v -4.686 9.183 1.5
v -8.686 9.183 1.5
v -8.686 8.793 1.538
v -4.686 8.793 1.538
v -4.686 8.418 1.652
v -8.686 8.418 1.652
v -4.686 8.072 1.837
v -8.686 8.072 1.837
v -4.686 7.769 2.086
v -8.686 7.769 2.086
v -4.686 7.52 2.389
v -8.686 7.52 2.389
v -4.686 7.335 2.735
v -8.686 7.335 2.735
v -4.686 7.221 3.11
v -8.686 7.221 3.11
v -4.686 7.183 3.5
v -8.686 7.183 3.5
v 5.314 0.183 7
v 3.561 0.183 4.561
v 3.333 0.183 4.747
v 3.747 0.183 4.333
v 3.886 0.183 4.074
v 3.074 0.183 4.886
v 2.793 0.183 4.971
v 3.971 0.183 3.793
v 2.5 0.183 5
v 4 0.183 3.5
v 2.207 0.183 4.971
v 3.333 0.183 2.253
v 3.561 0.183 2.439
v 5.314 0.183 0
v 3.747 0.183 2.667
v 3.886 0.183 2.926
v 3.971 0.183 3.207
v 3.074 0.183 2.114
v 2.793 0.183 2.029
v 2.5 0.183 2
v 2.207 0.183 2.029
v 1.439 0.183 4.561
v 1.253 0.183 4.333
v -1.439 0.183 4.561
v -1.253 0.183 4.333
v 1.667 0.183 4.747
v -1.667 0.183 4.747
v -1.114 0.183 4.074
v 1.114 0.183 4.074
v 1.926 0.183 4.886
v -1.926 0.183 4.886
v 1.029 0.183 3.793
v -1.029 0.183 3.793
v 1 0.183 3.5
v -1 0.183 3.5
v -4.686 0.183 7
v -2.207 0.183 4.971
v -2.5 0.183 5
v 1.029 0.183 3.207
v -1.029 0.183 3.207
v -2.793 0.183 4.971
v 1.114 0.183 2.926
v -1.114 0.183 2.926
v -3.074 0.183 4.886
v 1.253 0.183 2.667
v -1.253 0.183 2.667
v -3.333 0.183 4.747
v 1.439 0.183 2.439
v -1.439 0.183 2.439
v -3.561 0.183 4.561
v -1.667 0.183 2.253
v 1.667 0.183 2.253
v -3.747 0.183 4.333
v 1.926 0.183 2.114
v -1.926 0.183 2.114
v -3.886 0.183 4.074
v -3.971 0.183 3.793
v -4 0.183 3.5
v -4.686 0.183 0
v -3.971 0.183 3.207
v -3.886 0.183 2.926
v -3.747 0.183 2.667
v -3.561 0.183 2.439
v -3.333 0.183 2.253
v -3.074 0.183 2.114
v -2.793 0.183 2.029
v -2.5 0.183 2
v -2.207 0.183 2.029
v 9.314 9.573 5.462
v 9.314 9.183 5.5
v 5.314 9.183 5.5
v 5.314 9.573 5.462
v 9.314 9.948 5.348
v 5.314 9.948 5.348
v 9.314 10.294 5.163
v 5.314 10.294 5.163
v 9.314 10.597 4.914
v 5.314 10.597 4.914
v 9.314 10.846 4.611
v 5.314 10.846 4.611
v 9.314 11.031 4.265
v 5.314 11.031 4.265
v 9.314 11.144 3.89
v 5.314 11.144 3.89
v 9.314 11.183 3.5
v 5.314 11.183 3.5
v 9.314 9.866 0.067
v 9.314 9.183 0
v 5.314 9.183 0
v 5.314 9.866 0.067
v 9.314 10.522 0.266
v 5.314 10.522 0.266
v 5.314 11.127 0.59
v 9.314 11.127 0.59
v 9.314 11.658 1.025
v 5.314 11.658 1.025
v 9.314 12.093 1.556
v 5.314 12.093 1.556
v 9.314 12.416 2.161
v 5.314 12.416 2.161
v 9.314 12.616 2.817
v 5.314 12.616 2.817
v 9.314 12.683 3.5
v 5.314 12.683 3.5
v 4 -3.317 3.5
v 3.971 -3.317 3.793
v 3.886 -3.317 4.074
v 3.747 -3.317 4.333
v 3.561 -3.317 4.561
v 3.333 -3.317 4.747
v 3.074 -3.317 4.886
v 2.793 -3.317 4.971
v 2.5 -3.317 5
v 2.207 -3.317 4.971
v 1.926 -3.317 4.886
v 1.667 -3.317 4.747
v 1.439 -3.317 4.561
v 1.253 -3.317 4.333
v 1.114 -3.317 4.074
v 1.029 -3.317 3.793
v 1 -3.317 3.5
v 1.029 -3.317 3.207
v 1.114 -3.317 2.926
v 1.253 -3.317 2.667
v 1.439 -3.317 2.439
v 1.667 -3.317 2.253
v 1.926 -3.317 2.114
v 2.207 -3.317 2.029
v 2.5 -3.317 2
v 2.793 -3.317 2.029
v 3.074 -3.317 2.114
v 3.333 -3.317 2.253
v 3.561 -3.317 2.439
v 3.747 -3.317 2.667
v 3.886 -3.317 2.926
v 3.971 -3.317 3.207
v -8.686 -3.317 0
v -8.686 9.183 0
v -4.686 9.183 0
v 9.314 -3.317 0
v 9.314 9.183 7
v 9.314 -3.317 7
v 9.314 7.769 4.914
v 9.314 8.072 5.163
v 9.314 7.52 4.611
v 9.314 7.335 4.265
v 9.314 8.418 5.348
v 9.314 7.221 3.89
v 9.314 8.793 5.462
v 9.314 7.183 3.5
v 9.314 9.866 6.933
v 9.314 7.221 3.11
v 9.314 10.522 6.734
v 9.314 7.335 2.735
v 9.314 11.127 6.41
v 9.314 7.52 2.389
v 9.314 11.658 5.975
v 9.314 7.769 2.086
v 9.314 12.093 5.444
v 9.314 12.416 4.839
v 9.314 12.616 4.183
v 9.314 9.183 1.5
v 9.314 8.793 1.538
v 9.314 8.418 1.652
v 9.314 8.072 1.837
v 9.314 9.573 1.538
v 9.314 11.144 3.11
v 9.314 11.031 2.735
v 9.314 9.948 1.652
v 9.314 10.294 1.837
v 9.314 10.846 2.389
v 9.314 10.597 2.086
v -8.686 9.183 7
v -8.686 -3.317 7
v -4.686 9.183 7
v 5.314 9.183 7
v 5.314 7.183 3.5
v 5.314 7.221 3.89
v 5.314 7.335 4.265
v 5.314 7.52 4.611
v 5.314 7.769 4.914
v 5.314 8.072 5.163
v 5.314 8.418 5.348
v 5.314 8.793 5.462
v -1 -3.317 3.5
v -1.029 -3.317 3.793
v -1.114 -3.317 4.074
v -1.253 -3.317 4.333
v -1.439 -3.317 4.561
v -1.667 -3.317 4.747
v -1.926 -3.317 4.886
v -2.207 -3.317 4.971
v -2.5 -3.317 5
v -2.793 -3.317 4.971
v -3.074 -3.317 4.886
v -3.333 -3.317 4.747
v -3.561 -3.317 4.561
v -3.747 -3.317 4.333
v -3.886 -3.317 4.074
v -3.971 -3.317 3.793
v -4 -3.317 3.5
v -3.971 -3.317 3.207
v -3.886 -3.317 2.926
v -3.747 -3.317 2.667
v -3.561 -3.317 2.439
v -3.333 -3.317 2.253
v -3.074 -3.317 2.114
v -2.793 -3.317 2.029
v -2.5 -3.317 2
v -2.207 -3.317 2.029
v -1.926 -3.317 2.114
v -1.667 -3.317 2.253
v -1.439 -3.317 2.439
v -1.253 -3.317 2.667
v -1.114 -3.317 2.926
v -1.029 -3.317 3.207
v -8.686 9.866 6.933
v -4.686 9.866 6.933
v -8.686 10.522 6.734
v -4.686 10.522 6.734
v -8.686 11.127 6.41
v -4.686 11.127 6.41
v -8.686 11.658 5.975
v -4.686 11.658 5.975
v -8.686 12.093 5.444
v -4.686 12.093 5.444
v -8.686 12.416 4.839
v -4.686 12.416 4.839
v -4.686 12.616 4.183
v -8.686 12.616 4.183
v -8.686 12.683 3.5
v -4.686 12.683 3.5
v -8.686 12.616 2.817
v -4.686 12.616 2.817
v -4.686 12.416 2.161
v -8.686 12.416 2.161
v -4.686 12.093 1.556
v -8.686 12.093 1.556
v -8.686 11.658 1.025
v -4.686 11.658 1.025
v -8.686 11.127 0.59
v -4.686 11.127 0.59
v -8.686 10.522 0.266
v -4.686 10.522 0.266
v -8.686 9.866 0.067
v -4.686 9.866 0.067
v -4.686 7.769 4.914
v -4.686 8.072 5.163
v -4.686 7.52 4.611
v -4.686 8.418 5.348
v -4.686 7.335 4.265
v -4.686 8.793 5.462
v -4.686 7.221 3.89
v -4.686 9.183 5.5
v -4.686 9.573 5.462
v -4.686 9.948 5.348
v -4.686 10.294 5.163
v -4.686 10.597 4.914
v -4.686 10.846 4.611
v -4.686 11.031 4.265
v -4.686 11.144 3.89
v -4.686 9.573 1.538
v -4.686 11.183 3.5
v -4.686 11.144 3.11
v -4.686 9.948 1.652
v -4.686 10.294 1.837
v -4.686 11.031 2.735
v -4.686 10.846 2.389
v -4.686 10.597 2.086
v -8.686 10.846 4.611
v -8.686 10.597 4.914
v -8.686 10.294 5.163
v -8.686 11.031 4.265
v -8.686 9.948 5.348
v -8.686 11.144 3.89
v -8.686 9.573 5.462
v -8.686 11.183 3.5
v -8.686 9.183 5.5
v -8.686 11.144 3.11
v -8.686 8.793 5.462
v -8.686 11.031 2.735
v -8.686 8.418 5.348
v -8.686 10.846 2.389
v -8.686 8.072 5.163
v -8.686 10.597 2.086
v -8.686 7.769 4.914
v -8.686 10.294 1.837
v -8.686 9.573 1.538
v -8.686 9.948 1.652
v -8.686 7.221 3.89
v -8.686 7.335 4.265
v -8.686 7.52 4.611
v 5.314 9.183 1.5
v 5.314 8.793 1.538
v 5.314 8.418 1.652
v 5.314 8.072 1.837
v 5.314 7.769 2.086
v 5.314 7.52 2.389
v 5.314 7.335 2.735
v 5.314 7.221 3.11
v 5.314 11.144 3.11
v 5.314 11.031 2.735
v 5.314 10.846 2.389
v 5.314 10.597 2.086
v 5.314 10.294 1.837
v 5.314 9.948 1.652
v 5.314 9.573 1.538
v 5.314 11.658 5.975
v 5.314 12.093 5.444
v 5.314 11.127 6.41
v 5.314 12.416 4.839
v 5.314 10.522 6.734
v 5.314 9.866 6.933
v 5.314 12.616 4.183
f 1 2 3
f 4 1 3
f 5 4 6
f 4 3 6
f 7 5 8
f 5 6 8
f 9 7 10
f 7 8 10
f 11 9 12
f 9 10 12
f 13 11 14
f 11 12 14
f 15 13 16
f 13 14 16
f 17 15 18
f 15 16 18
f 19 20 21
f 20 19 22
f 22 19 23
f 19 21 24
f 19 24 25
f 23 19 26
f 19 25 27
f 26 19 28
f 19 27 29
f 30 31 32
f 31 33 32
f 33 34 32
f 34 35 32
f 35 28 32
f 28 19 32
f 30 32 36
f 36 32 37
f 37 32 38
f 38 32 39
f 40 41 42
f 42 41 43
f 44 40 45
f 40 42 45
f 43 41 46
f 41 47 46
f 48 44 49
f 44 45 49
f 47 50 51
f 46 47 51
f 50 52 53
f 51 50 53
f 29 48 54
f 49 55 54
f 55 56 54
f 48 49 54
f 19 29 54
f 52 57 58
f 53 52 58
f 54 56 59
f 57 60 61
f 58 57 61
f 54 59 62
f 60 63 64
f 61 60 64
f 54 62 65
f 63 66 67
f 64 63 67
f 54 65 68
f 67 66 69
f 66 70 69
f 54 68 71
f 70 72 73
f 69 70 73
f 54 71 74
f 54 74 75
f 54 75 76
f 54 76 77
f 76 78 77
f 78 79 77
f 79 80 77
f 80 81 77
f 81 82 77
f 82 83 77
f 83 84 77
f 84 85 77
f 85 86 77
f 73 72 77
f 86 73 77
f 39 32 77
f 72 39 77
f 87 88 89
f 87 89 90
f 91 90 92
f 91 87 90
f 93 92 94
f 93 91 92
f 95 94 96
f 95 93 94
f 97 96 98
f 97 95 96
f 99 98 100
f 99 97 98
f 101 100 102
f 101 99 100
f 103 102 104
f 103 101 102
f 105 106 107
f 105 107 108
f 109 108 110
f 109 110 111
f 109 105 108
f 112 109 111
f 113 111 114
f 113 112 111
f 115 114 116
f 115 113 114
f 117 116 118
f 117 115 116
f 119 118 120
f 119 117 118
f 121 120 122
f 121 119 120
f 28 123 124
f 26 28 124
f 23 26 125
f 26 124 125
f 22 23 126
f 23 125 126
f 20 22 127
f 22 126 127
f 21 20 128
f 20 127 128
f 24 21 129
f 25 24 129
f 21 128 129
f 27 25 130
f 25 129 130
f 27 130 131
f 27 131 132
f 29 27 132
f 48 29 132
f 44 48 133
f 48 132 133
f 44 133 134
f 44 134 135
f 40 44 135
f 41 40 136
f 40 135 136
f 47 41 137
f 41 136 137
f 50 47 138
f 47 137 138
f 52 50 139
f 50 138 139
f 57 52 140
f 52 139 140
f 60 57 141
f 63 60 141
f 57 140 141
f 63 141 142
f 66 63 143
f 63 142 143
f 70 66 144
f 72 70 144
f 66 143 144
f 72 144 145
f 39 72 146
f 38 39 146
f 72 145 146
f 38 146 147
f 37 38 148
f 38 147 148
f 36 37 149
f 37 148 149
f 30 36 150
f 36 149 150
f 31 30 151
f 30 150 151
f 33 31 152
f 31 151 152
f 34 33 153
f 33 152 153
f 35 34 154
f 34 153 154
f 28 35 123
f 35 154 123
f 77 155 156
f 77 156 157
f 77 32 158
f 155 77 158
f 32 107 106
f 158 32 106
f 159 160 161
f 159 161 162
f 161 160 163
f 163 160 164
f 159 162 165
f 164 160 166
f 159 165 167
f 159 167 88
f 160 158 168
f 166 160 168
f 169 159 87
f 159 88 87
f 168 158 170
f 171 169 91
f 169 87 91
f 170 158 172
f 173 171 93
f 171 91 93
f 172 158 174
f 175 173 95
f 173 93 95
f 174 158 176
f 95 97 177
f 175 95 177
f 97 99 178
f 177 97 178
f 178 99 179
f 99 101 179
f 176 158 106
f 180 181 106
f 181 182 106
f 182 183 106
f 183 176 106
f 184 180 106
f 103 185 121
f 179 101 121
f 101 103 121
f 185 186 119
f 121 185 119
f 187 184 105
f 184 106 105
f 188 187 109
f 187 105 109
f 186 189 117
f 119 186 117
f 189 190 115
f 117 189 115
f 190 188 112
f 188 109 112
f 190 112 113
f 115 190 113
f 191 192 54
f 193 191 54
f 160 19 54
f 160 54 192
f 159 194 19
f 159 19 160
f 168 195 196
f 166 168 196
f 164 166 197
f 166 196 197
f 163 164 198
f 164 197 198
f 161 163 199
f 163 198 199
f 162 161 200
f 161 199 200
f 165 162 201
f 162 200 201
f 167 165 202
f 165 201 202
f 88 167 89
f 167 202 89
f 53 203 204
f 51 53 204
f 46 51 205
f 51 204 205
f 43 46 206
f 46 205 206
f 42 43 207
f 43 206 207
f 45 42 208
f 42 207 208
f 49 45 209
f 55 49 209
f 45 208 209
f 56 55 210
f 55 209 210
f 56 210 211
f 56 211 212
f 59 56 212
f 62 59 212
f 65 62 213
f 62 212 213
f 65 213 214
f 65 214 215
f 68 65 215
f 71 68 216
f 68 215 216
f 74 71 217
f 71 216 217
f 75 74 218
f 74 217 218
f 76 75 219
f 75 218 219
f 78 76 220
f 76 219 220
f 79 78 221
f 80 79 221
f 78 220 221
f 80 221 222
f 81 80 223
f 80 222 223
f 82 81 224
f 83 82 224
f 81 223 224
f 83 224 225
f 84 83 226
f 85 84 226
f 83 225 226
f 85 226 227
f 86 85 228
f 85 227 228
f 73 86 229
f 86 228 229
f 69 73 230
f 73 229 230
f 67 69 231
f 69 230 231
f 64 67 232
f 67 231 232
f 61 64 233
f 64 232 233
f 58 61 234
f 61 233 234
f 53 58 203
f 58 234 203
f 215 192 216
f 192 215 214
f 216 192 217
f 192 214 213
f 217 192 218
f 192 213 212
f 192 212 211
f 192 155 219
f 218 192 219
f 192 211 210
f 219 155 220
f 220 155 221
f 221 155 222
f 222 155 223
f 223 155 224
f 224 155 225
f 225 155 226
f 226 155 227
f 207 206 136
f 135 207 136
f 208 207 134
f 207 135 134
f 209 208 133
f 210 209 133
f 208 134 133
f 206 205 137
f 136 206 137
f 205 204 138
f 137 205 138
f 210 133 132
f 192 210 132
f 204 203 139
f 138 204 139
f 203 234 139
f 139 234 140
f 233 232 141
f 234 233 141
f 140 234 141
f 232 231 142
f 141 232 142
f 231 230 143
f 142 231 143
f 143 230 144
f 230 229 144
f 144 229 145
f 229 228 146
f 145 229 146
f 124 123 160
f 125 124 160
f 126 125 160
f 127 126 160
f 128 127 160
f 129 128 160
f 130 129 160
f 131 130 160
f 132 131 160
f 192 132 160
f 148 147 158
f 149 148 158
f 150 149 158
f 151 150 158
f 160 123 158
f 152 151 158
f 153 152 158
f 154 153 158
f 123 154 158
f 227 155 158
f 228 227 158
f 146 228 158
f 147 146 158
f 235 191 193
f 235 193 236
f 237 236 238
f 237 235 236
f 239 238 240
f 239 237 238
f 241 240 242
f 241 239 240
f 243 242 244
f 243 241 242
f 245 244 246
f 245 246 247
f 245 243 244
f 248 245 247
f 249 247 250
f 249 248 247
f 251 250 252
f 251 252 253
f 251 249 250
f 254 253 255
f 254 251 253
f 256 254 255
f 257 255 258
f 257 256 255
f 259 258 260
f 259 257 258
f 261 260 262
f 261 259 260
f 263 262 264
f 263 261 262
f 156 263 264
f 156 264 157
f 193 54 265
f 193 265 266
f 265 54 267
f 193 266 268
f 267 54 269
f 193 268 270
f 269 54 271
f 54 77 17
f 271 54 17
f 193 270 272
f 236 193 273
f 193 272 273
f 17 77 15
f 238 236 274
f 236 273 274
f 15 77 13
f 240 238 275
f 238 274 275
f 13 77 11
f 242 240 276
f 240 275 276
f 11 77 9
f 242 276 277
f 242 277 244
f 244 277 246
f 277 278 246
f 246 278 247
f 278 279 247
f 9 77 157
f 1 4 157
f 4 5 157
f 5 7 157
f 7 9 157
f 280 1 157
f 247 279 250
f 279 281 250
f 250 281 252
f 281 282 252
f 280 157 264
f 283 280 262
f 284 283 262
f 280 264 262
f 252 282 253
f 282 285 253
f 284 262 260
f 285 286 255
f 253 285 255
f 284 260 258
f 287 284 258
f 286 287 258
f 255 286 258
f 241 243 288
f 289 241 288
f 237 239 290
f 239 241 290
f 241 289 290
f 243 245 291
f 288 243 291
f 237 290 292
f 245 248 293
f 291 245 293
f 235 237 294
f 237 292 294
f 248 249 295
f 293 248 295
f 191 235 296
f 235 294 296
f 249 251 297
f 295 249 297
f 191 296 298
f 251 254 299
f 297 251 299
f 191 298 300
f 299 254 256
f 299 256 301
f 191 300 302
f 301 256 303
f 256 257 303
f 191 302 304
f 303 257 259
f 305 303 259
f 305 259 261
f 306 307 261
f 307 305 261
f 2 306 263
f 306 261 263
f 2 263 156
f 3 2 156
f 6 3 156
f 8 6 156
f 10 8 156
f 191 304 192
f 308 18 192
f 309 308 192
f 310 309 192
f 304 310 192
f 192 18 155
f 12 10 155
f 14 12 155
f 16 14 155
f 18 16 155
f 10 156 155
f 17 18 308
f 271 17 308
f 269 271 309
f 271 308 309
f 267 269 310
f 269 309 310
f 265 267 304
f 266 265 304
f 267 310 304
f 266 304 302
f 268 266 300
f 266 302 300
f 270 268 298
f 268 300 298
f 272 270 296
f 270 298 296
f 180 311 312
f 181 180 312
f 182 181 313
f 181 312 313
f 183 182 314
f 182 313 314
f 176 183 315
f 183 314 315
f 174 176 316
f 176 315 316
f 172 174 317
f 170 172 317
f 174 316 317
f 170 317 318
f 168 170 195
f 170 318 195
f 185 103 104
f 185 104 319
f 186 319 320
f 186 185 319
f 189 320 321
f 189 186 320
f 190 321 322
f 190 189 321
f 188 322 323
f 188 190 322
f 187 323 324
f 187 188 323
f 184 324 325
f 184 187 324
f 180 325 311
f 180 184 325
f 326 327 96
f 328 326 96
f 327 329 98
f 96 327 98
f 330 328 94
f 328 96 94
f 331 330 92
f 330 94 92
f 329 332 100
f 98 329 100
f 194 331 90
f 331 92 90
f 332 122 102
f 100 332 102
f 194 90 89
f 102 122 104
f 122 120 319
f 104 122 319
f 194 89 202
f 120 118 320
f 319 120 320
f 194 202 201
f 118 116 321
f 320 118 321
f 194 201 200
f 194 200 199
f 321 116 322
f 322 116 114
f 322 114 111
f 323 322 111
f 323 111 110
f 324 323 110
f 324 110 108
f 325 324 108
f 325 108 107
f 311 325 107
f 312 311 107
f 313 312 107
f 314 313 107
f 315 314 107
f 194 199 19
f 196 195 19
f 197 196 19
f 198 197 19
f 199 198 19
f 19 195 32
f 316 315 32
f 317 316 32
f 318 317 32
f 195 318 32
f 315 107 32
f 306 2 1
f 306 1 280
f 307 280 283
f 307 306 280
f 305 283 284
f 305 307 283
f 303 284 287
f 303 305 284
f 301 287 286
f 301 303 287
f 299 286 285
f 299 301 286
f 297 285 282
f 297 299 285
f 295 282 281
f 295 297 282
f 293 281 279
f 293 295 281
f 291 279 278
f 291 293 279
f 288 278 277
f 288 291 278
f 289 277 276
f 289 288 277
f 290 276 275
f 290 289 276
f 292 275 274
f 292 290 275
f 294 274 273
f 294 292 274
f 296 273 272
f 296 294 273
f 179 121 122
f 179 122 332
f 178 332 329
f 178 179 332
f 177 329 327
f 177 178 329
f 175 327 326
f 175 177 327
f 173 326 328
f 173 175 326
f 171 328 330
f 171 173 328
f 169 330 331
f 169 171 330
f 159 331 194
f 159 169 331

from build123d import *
from build123d import SkipClean  # not in build123d's __all__

# Parameters (mm, degrees)
F1_DEPTH = 7
F3_DEPTH = 18
F4_DEPTH = 4
F6_DEPTH = 4
F7_R     = 1.5
F8_DEPTH = 3.5


with BuildPart() as f1:
    # F0 (on Top) → F1 (new body)
    with BuildSketch(Plane.XY):
        Polygon((-8.6863613641, -3.3171127737), (0.3136386359, -3.3171127737), (9.3136386359, -3.3171127737), (9.3136386359, 0.1828872263), (9.3136386359, 9.1828872263), (5.3136386359, 9.1828872263), (5.3136386359, 0.1828872263), (-4.6863613641, 0.1828872263), (-4.6863613641, 9.1828872263), (-8.6863613641, 9.1828872263), (-8.6863613641, 0.1828872263), align=None)
    extrude(amount=F1_DEPTH)

    # F2 (on face) → F3 (cut, through all)
    with BuildSketch(Plane(origin=(-8.6863613641, 0, 0), x_dir=(0, -1, 0), z_dir=(-1, 0, 0))):
        with BuildLine():
            Line((-9.1828872263, 5.5), (-9.1828872263, 1.5))
            ThreePointArc((-9.1828872263, 1.5), (-7.768673664, 2.0857864376), (-7.1828872263, 3.5))
            ThreePointArc((-7.1828872263, 3.5), (-7.768673664, 4.9142135624), (-9.1828872263, 5.5))
        make_face()
    extrude(amount=-F3_DEPTH, mode=Mode.SUBTRACT)

    # F2 (on face) → F4 (join, through all)
    with BuildSketch(Plane(origin=(-8.6863613641, 0, 0), x_dir=(0, -1, 0), z_dir=(-1, 0, 0))):
        with BuildLine():
            ThreePointArc((-9.1828872263, 7), (-12.6828872263, 3.5), (-9.1828872263, 0))
            Line((-9.1828872263, 0), (-9.1828872263, 1.5))
            ThreePointArc((-9.1828872263, 1.5), (-11.1828872263, 3.5), (-9.1828872263, 5.5))
            Line((-9.1828872263, 5.5), (-9.1828872263, 7))
        make_face()
    with SkipClean():  # cleaning this boolean's faces spoils the solid; the shape is the same uncleaned
        extrude(amount=-F4_DEPTH)

    # F5 (on face) → F6 (join, through all)
    with BuildSketch(Plane.YZ.offset(9.3136386359)):
        with BuildLine():
            ThreePointArc((9.1828872263, 1.5), (7.1828872263, 3.5), (9.1828872263, 5.5))
            Line((9.1828872263, 5.5), (9.1828872263, 7))
            ThreePointArc((9.1828872263, 7), (5.6828872263, 3.5), (9.1828872263, 0))
            Line((9.1828872263, 0), (9.1828872263, 1.5))
        make_face()
        with BuildLine():
            Line((9.1828872263, 7), (9.1828872263, 5.5))
            ThreePointArc((9.1828872263, 5.5), (10.5971007887, 4.9142135624), (11.1828872263, 3.5))
            ThreePointArc((11.1828872263, 3.5), (10.5971007887, 2.0857864376), (9.1828872263, 1.5))
            Line((9.1828872263, 1.5), (9.1828872263, 0))
            ThreePointArc((9.1828872263, 0), (11.6577609605, 1.0251262658), (12.6828872263, 3.5))
            ThreePointArc((12.6828872263, 3.5), (11.6577609605, 5.9748737342), (9.1828872263, 7))
        make_face()
        with BuildLine():
            ThreePointArc((9.1828872263, 0), (5.6828872263, 3.5), (9.1828872263, 7))
            Line((9.1828872263, 7), (-3.3171127737, 7))
            Line((-3.3171127737, 7), (-3.3171127737, 0))
            Line((-3.3171127737, 0), (9.1828872263, 0))
        make_face()
    extrude(amount=-F6_DEPTH)

    # F7 (on face) → F8 (cut, through all)
    with BuildSketch(Plane.XZ.offset(3.3171127737)):
        with Locations((-2.5, 3.5)):
            Circle(F7_R)
        with Locations((2.5, 3.5)):
            Circle(F7_R)
    extrude(amount=-F8_DEPTH, mode=Mode.SUBTRACT)


solid = f1.part
